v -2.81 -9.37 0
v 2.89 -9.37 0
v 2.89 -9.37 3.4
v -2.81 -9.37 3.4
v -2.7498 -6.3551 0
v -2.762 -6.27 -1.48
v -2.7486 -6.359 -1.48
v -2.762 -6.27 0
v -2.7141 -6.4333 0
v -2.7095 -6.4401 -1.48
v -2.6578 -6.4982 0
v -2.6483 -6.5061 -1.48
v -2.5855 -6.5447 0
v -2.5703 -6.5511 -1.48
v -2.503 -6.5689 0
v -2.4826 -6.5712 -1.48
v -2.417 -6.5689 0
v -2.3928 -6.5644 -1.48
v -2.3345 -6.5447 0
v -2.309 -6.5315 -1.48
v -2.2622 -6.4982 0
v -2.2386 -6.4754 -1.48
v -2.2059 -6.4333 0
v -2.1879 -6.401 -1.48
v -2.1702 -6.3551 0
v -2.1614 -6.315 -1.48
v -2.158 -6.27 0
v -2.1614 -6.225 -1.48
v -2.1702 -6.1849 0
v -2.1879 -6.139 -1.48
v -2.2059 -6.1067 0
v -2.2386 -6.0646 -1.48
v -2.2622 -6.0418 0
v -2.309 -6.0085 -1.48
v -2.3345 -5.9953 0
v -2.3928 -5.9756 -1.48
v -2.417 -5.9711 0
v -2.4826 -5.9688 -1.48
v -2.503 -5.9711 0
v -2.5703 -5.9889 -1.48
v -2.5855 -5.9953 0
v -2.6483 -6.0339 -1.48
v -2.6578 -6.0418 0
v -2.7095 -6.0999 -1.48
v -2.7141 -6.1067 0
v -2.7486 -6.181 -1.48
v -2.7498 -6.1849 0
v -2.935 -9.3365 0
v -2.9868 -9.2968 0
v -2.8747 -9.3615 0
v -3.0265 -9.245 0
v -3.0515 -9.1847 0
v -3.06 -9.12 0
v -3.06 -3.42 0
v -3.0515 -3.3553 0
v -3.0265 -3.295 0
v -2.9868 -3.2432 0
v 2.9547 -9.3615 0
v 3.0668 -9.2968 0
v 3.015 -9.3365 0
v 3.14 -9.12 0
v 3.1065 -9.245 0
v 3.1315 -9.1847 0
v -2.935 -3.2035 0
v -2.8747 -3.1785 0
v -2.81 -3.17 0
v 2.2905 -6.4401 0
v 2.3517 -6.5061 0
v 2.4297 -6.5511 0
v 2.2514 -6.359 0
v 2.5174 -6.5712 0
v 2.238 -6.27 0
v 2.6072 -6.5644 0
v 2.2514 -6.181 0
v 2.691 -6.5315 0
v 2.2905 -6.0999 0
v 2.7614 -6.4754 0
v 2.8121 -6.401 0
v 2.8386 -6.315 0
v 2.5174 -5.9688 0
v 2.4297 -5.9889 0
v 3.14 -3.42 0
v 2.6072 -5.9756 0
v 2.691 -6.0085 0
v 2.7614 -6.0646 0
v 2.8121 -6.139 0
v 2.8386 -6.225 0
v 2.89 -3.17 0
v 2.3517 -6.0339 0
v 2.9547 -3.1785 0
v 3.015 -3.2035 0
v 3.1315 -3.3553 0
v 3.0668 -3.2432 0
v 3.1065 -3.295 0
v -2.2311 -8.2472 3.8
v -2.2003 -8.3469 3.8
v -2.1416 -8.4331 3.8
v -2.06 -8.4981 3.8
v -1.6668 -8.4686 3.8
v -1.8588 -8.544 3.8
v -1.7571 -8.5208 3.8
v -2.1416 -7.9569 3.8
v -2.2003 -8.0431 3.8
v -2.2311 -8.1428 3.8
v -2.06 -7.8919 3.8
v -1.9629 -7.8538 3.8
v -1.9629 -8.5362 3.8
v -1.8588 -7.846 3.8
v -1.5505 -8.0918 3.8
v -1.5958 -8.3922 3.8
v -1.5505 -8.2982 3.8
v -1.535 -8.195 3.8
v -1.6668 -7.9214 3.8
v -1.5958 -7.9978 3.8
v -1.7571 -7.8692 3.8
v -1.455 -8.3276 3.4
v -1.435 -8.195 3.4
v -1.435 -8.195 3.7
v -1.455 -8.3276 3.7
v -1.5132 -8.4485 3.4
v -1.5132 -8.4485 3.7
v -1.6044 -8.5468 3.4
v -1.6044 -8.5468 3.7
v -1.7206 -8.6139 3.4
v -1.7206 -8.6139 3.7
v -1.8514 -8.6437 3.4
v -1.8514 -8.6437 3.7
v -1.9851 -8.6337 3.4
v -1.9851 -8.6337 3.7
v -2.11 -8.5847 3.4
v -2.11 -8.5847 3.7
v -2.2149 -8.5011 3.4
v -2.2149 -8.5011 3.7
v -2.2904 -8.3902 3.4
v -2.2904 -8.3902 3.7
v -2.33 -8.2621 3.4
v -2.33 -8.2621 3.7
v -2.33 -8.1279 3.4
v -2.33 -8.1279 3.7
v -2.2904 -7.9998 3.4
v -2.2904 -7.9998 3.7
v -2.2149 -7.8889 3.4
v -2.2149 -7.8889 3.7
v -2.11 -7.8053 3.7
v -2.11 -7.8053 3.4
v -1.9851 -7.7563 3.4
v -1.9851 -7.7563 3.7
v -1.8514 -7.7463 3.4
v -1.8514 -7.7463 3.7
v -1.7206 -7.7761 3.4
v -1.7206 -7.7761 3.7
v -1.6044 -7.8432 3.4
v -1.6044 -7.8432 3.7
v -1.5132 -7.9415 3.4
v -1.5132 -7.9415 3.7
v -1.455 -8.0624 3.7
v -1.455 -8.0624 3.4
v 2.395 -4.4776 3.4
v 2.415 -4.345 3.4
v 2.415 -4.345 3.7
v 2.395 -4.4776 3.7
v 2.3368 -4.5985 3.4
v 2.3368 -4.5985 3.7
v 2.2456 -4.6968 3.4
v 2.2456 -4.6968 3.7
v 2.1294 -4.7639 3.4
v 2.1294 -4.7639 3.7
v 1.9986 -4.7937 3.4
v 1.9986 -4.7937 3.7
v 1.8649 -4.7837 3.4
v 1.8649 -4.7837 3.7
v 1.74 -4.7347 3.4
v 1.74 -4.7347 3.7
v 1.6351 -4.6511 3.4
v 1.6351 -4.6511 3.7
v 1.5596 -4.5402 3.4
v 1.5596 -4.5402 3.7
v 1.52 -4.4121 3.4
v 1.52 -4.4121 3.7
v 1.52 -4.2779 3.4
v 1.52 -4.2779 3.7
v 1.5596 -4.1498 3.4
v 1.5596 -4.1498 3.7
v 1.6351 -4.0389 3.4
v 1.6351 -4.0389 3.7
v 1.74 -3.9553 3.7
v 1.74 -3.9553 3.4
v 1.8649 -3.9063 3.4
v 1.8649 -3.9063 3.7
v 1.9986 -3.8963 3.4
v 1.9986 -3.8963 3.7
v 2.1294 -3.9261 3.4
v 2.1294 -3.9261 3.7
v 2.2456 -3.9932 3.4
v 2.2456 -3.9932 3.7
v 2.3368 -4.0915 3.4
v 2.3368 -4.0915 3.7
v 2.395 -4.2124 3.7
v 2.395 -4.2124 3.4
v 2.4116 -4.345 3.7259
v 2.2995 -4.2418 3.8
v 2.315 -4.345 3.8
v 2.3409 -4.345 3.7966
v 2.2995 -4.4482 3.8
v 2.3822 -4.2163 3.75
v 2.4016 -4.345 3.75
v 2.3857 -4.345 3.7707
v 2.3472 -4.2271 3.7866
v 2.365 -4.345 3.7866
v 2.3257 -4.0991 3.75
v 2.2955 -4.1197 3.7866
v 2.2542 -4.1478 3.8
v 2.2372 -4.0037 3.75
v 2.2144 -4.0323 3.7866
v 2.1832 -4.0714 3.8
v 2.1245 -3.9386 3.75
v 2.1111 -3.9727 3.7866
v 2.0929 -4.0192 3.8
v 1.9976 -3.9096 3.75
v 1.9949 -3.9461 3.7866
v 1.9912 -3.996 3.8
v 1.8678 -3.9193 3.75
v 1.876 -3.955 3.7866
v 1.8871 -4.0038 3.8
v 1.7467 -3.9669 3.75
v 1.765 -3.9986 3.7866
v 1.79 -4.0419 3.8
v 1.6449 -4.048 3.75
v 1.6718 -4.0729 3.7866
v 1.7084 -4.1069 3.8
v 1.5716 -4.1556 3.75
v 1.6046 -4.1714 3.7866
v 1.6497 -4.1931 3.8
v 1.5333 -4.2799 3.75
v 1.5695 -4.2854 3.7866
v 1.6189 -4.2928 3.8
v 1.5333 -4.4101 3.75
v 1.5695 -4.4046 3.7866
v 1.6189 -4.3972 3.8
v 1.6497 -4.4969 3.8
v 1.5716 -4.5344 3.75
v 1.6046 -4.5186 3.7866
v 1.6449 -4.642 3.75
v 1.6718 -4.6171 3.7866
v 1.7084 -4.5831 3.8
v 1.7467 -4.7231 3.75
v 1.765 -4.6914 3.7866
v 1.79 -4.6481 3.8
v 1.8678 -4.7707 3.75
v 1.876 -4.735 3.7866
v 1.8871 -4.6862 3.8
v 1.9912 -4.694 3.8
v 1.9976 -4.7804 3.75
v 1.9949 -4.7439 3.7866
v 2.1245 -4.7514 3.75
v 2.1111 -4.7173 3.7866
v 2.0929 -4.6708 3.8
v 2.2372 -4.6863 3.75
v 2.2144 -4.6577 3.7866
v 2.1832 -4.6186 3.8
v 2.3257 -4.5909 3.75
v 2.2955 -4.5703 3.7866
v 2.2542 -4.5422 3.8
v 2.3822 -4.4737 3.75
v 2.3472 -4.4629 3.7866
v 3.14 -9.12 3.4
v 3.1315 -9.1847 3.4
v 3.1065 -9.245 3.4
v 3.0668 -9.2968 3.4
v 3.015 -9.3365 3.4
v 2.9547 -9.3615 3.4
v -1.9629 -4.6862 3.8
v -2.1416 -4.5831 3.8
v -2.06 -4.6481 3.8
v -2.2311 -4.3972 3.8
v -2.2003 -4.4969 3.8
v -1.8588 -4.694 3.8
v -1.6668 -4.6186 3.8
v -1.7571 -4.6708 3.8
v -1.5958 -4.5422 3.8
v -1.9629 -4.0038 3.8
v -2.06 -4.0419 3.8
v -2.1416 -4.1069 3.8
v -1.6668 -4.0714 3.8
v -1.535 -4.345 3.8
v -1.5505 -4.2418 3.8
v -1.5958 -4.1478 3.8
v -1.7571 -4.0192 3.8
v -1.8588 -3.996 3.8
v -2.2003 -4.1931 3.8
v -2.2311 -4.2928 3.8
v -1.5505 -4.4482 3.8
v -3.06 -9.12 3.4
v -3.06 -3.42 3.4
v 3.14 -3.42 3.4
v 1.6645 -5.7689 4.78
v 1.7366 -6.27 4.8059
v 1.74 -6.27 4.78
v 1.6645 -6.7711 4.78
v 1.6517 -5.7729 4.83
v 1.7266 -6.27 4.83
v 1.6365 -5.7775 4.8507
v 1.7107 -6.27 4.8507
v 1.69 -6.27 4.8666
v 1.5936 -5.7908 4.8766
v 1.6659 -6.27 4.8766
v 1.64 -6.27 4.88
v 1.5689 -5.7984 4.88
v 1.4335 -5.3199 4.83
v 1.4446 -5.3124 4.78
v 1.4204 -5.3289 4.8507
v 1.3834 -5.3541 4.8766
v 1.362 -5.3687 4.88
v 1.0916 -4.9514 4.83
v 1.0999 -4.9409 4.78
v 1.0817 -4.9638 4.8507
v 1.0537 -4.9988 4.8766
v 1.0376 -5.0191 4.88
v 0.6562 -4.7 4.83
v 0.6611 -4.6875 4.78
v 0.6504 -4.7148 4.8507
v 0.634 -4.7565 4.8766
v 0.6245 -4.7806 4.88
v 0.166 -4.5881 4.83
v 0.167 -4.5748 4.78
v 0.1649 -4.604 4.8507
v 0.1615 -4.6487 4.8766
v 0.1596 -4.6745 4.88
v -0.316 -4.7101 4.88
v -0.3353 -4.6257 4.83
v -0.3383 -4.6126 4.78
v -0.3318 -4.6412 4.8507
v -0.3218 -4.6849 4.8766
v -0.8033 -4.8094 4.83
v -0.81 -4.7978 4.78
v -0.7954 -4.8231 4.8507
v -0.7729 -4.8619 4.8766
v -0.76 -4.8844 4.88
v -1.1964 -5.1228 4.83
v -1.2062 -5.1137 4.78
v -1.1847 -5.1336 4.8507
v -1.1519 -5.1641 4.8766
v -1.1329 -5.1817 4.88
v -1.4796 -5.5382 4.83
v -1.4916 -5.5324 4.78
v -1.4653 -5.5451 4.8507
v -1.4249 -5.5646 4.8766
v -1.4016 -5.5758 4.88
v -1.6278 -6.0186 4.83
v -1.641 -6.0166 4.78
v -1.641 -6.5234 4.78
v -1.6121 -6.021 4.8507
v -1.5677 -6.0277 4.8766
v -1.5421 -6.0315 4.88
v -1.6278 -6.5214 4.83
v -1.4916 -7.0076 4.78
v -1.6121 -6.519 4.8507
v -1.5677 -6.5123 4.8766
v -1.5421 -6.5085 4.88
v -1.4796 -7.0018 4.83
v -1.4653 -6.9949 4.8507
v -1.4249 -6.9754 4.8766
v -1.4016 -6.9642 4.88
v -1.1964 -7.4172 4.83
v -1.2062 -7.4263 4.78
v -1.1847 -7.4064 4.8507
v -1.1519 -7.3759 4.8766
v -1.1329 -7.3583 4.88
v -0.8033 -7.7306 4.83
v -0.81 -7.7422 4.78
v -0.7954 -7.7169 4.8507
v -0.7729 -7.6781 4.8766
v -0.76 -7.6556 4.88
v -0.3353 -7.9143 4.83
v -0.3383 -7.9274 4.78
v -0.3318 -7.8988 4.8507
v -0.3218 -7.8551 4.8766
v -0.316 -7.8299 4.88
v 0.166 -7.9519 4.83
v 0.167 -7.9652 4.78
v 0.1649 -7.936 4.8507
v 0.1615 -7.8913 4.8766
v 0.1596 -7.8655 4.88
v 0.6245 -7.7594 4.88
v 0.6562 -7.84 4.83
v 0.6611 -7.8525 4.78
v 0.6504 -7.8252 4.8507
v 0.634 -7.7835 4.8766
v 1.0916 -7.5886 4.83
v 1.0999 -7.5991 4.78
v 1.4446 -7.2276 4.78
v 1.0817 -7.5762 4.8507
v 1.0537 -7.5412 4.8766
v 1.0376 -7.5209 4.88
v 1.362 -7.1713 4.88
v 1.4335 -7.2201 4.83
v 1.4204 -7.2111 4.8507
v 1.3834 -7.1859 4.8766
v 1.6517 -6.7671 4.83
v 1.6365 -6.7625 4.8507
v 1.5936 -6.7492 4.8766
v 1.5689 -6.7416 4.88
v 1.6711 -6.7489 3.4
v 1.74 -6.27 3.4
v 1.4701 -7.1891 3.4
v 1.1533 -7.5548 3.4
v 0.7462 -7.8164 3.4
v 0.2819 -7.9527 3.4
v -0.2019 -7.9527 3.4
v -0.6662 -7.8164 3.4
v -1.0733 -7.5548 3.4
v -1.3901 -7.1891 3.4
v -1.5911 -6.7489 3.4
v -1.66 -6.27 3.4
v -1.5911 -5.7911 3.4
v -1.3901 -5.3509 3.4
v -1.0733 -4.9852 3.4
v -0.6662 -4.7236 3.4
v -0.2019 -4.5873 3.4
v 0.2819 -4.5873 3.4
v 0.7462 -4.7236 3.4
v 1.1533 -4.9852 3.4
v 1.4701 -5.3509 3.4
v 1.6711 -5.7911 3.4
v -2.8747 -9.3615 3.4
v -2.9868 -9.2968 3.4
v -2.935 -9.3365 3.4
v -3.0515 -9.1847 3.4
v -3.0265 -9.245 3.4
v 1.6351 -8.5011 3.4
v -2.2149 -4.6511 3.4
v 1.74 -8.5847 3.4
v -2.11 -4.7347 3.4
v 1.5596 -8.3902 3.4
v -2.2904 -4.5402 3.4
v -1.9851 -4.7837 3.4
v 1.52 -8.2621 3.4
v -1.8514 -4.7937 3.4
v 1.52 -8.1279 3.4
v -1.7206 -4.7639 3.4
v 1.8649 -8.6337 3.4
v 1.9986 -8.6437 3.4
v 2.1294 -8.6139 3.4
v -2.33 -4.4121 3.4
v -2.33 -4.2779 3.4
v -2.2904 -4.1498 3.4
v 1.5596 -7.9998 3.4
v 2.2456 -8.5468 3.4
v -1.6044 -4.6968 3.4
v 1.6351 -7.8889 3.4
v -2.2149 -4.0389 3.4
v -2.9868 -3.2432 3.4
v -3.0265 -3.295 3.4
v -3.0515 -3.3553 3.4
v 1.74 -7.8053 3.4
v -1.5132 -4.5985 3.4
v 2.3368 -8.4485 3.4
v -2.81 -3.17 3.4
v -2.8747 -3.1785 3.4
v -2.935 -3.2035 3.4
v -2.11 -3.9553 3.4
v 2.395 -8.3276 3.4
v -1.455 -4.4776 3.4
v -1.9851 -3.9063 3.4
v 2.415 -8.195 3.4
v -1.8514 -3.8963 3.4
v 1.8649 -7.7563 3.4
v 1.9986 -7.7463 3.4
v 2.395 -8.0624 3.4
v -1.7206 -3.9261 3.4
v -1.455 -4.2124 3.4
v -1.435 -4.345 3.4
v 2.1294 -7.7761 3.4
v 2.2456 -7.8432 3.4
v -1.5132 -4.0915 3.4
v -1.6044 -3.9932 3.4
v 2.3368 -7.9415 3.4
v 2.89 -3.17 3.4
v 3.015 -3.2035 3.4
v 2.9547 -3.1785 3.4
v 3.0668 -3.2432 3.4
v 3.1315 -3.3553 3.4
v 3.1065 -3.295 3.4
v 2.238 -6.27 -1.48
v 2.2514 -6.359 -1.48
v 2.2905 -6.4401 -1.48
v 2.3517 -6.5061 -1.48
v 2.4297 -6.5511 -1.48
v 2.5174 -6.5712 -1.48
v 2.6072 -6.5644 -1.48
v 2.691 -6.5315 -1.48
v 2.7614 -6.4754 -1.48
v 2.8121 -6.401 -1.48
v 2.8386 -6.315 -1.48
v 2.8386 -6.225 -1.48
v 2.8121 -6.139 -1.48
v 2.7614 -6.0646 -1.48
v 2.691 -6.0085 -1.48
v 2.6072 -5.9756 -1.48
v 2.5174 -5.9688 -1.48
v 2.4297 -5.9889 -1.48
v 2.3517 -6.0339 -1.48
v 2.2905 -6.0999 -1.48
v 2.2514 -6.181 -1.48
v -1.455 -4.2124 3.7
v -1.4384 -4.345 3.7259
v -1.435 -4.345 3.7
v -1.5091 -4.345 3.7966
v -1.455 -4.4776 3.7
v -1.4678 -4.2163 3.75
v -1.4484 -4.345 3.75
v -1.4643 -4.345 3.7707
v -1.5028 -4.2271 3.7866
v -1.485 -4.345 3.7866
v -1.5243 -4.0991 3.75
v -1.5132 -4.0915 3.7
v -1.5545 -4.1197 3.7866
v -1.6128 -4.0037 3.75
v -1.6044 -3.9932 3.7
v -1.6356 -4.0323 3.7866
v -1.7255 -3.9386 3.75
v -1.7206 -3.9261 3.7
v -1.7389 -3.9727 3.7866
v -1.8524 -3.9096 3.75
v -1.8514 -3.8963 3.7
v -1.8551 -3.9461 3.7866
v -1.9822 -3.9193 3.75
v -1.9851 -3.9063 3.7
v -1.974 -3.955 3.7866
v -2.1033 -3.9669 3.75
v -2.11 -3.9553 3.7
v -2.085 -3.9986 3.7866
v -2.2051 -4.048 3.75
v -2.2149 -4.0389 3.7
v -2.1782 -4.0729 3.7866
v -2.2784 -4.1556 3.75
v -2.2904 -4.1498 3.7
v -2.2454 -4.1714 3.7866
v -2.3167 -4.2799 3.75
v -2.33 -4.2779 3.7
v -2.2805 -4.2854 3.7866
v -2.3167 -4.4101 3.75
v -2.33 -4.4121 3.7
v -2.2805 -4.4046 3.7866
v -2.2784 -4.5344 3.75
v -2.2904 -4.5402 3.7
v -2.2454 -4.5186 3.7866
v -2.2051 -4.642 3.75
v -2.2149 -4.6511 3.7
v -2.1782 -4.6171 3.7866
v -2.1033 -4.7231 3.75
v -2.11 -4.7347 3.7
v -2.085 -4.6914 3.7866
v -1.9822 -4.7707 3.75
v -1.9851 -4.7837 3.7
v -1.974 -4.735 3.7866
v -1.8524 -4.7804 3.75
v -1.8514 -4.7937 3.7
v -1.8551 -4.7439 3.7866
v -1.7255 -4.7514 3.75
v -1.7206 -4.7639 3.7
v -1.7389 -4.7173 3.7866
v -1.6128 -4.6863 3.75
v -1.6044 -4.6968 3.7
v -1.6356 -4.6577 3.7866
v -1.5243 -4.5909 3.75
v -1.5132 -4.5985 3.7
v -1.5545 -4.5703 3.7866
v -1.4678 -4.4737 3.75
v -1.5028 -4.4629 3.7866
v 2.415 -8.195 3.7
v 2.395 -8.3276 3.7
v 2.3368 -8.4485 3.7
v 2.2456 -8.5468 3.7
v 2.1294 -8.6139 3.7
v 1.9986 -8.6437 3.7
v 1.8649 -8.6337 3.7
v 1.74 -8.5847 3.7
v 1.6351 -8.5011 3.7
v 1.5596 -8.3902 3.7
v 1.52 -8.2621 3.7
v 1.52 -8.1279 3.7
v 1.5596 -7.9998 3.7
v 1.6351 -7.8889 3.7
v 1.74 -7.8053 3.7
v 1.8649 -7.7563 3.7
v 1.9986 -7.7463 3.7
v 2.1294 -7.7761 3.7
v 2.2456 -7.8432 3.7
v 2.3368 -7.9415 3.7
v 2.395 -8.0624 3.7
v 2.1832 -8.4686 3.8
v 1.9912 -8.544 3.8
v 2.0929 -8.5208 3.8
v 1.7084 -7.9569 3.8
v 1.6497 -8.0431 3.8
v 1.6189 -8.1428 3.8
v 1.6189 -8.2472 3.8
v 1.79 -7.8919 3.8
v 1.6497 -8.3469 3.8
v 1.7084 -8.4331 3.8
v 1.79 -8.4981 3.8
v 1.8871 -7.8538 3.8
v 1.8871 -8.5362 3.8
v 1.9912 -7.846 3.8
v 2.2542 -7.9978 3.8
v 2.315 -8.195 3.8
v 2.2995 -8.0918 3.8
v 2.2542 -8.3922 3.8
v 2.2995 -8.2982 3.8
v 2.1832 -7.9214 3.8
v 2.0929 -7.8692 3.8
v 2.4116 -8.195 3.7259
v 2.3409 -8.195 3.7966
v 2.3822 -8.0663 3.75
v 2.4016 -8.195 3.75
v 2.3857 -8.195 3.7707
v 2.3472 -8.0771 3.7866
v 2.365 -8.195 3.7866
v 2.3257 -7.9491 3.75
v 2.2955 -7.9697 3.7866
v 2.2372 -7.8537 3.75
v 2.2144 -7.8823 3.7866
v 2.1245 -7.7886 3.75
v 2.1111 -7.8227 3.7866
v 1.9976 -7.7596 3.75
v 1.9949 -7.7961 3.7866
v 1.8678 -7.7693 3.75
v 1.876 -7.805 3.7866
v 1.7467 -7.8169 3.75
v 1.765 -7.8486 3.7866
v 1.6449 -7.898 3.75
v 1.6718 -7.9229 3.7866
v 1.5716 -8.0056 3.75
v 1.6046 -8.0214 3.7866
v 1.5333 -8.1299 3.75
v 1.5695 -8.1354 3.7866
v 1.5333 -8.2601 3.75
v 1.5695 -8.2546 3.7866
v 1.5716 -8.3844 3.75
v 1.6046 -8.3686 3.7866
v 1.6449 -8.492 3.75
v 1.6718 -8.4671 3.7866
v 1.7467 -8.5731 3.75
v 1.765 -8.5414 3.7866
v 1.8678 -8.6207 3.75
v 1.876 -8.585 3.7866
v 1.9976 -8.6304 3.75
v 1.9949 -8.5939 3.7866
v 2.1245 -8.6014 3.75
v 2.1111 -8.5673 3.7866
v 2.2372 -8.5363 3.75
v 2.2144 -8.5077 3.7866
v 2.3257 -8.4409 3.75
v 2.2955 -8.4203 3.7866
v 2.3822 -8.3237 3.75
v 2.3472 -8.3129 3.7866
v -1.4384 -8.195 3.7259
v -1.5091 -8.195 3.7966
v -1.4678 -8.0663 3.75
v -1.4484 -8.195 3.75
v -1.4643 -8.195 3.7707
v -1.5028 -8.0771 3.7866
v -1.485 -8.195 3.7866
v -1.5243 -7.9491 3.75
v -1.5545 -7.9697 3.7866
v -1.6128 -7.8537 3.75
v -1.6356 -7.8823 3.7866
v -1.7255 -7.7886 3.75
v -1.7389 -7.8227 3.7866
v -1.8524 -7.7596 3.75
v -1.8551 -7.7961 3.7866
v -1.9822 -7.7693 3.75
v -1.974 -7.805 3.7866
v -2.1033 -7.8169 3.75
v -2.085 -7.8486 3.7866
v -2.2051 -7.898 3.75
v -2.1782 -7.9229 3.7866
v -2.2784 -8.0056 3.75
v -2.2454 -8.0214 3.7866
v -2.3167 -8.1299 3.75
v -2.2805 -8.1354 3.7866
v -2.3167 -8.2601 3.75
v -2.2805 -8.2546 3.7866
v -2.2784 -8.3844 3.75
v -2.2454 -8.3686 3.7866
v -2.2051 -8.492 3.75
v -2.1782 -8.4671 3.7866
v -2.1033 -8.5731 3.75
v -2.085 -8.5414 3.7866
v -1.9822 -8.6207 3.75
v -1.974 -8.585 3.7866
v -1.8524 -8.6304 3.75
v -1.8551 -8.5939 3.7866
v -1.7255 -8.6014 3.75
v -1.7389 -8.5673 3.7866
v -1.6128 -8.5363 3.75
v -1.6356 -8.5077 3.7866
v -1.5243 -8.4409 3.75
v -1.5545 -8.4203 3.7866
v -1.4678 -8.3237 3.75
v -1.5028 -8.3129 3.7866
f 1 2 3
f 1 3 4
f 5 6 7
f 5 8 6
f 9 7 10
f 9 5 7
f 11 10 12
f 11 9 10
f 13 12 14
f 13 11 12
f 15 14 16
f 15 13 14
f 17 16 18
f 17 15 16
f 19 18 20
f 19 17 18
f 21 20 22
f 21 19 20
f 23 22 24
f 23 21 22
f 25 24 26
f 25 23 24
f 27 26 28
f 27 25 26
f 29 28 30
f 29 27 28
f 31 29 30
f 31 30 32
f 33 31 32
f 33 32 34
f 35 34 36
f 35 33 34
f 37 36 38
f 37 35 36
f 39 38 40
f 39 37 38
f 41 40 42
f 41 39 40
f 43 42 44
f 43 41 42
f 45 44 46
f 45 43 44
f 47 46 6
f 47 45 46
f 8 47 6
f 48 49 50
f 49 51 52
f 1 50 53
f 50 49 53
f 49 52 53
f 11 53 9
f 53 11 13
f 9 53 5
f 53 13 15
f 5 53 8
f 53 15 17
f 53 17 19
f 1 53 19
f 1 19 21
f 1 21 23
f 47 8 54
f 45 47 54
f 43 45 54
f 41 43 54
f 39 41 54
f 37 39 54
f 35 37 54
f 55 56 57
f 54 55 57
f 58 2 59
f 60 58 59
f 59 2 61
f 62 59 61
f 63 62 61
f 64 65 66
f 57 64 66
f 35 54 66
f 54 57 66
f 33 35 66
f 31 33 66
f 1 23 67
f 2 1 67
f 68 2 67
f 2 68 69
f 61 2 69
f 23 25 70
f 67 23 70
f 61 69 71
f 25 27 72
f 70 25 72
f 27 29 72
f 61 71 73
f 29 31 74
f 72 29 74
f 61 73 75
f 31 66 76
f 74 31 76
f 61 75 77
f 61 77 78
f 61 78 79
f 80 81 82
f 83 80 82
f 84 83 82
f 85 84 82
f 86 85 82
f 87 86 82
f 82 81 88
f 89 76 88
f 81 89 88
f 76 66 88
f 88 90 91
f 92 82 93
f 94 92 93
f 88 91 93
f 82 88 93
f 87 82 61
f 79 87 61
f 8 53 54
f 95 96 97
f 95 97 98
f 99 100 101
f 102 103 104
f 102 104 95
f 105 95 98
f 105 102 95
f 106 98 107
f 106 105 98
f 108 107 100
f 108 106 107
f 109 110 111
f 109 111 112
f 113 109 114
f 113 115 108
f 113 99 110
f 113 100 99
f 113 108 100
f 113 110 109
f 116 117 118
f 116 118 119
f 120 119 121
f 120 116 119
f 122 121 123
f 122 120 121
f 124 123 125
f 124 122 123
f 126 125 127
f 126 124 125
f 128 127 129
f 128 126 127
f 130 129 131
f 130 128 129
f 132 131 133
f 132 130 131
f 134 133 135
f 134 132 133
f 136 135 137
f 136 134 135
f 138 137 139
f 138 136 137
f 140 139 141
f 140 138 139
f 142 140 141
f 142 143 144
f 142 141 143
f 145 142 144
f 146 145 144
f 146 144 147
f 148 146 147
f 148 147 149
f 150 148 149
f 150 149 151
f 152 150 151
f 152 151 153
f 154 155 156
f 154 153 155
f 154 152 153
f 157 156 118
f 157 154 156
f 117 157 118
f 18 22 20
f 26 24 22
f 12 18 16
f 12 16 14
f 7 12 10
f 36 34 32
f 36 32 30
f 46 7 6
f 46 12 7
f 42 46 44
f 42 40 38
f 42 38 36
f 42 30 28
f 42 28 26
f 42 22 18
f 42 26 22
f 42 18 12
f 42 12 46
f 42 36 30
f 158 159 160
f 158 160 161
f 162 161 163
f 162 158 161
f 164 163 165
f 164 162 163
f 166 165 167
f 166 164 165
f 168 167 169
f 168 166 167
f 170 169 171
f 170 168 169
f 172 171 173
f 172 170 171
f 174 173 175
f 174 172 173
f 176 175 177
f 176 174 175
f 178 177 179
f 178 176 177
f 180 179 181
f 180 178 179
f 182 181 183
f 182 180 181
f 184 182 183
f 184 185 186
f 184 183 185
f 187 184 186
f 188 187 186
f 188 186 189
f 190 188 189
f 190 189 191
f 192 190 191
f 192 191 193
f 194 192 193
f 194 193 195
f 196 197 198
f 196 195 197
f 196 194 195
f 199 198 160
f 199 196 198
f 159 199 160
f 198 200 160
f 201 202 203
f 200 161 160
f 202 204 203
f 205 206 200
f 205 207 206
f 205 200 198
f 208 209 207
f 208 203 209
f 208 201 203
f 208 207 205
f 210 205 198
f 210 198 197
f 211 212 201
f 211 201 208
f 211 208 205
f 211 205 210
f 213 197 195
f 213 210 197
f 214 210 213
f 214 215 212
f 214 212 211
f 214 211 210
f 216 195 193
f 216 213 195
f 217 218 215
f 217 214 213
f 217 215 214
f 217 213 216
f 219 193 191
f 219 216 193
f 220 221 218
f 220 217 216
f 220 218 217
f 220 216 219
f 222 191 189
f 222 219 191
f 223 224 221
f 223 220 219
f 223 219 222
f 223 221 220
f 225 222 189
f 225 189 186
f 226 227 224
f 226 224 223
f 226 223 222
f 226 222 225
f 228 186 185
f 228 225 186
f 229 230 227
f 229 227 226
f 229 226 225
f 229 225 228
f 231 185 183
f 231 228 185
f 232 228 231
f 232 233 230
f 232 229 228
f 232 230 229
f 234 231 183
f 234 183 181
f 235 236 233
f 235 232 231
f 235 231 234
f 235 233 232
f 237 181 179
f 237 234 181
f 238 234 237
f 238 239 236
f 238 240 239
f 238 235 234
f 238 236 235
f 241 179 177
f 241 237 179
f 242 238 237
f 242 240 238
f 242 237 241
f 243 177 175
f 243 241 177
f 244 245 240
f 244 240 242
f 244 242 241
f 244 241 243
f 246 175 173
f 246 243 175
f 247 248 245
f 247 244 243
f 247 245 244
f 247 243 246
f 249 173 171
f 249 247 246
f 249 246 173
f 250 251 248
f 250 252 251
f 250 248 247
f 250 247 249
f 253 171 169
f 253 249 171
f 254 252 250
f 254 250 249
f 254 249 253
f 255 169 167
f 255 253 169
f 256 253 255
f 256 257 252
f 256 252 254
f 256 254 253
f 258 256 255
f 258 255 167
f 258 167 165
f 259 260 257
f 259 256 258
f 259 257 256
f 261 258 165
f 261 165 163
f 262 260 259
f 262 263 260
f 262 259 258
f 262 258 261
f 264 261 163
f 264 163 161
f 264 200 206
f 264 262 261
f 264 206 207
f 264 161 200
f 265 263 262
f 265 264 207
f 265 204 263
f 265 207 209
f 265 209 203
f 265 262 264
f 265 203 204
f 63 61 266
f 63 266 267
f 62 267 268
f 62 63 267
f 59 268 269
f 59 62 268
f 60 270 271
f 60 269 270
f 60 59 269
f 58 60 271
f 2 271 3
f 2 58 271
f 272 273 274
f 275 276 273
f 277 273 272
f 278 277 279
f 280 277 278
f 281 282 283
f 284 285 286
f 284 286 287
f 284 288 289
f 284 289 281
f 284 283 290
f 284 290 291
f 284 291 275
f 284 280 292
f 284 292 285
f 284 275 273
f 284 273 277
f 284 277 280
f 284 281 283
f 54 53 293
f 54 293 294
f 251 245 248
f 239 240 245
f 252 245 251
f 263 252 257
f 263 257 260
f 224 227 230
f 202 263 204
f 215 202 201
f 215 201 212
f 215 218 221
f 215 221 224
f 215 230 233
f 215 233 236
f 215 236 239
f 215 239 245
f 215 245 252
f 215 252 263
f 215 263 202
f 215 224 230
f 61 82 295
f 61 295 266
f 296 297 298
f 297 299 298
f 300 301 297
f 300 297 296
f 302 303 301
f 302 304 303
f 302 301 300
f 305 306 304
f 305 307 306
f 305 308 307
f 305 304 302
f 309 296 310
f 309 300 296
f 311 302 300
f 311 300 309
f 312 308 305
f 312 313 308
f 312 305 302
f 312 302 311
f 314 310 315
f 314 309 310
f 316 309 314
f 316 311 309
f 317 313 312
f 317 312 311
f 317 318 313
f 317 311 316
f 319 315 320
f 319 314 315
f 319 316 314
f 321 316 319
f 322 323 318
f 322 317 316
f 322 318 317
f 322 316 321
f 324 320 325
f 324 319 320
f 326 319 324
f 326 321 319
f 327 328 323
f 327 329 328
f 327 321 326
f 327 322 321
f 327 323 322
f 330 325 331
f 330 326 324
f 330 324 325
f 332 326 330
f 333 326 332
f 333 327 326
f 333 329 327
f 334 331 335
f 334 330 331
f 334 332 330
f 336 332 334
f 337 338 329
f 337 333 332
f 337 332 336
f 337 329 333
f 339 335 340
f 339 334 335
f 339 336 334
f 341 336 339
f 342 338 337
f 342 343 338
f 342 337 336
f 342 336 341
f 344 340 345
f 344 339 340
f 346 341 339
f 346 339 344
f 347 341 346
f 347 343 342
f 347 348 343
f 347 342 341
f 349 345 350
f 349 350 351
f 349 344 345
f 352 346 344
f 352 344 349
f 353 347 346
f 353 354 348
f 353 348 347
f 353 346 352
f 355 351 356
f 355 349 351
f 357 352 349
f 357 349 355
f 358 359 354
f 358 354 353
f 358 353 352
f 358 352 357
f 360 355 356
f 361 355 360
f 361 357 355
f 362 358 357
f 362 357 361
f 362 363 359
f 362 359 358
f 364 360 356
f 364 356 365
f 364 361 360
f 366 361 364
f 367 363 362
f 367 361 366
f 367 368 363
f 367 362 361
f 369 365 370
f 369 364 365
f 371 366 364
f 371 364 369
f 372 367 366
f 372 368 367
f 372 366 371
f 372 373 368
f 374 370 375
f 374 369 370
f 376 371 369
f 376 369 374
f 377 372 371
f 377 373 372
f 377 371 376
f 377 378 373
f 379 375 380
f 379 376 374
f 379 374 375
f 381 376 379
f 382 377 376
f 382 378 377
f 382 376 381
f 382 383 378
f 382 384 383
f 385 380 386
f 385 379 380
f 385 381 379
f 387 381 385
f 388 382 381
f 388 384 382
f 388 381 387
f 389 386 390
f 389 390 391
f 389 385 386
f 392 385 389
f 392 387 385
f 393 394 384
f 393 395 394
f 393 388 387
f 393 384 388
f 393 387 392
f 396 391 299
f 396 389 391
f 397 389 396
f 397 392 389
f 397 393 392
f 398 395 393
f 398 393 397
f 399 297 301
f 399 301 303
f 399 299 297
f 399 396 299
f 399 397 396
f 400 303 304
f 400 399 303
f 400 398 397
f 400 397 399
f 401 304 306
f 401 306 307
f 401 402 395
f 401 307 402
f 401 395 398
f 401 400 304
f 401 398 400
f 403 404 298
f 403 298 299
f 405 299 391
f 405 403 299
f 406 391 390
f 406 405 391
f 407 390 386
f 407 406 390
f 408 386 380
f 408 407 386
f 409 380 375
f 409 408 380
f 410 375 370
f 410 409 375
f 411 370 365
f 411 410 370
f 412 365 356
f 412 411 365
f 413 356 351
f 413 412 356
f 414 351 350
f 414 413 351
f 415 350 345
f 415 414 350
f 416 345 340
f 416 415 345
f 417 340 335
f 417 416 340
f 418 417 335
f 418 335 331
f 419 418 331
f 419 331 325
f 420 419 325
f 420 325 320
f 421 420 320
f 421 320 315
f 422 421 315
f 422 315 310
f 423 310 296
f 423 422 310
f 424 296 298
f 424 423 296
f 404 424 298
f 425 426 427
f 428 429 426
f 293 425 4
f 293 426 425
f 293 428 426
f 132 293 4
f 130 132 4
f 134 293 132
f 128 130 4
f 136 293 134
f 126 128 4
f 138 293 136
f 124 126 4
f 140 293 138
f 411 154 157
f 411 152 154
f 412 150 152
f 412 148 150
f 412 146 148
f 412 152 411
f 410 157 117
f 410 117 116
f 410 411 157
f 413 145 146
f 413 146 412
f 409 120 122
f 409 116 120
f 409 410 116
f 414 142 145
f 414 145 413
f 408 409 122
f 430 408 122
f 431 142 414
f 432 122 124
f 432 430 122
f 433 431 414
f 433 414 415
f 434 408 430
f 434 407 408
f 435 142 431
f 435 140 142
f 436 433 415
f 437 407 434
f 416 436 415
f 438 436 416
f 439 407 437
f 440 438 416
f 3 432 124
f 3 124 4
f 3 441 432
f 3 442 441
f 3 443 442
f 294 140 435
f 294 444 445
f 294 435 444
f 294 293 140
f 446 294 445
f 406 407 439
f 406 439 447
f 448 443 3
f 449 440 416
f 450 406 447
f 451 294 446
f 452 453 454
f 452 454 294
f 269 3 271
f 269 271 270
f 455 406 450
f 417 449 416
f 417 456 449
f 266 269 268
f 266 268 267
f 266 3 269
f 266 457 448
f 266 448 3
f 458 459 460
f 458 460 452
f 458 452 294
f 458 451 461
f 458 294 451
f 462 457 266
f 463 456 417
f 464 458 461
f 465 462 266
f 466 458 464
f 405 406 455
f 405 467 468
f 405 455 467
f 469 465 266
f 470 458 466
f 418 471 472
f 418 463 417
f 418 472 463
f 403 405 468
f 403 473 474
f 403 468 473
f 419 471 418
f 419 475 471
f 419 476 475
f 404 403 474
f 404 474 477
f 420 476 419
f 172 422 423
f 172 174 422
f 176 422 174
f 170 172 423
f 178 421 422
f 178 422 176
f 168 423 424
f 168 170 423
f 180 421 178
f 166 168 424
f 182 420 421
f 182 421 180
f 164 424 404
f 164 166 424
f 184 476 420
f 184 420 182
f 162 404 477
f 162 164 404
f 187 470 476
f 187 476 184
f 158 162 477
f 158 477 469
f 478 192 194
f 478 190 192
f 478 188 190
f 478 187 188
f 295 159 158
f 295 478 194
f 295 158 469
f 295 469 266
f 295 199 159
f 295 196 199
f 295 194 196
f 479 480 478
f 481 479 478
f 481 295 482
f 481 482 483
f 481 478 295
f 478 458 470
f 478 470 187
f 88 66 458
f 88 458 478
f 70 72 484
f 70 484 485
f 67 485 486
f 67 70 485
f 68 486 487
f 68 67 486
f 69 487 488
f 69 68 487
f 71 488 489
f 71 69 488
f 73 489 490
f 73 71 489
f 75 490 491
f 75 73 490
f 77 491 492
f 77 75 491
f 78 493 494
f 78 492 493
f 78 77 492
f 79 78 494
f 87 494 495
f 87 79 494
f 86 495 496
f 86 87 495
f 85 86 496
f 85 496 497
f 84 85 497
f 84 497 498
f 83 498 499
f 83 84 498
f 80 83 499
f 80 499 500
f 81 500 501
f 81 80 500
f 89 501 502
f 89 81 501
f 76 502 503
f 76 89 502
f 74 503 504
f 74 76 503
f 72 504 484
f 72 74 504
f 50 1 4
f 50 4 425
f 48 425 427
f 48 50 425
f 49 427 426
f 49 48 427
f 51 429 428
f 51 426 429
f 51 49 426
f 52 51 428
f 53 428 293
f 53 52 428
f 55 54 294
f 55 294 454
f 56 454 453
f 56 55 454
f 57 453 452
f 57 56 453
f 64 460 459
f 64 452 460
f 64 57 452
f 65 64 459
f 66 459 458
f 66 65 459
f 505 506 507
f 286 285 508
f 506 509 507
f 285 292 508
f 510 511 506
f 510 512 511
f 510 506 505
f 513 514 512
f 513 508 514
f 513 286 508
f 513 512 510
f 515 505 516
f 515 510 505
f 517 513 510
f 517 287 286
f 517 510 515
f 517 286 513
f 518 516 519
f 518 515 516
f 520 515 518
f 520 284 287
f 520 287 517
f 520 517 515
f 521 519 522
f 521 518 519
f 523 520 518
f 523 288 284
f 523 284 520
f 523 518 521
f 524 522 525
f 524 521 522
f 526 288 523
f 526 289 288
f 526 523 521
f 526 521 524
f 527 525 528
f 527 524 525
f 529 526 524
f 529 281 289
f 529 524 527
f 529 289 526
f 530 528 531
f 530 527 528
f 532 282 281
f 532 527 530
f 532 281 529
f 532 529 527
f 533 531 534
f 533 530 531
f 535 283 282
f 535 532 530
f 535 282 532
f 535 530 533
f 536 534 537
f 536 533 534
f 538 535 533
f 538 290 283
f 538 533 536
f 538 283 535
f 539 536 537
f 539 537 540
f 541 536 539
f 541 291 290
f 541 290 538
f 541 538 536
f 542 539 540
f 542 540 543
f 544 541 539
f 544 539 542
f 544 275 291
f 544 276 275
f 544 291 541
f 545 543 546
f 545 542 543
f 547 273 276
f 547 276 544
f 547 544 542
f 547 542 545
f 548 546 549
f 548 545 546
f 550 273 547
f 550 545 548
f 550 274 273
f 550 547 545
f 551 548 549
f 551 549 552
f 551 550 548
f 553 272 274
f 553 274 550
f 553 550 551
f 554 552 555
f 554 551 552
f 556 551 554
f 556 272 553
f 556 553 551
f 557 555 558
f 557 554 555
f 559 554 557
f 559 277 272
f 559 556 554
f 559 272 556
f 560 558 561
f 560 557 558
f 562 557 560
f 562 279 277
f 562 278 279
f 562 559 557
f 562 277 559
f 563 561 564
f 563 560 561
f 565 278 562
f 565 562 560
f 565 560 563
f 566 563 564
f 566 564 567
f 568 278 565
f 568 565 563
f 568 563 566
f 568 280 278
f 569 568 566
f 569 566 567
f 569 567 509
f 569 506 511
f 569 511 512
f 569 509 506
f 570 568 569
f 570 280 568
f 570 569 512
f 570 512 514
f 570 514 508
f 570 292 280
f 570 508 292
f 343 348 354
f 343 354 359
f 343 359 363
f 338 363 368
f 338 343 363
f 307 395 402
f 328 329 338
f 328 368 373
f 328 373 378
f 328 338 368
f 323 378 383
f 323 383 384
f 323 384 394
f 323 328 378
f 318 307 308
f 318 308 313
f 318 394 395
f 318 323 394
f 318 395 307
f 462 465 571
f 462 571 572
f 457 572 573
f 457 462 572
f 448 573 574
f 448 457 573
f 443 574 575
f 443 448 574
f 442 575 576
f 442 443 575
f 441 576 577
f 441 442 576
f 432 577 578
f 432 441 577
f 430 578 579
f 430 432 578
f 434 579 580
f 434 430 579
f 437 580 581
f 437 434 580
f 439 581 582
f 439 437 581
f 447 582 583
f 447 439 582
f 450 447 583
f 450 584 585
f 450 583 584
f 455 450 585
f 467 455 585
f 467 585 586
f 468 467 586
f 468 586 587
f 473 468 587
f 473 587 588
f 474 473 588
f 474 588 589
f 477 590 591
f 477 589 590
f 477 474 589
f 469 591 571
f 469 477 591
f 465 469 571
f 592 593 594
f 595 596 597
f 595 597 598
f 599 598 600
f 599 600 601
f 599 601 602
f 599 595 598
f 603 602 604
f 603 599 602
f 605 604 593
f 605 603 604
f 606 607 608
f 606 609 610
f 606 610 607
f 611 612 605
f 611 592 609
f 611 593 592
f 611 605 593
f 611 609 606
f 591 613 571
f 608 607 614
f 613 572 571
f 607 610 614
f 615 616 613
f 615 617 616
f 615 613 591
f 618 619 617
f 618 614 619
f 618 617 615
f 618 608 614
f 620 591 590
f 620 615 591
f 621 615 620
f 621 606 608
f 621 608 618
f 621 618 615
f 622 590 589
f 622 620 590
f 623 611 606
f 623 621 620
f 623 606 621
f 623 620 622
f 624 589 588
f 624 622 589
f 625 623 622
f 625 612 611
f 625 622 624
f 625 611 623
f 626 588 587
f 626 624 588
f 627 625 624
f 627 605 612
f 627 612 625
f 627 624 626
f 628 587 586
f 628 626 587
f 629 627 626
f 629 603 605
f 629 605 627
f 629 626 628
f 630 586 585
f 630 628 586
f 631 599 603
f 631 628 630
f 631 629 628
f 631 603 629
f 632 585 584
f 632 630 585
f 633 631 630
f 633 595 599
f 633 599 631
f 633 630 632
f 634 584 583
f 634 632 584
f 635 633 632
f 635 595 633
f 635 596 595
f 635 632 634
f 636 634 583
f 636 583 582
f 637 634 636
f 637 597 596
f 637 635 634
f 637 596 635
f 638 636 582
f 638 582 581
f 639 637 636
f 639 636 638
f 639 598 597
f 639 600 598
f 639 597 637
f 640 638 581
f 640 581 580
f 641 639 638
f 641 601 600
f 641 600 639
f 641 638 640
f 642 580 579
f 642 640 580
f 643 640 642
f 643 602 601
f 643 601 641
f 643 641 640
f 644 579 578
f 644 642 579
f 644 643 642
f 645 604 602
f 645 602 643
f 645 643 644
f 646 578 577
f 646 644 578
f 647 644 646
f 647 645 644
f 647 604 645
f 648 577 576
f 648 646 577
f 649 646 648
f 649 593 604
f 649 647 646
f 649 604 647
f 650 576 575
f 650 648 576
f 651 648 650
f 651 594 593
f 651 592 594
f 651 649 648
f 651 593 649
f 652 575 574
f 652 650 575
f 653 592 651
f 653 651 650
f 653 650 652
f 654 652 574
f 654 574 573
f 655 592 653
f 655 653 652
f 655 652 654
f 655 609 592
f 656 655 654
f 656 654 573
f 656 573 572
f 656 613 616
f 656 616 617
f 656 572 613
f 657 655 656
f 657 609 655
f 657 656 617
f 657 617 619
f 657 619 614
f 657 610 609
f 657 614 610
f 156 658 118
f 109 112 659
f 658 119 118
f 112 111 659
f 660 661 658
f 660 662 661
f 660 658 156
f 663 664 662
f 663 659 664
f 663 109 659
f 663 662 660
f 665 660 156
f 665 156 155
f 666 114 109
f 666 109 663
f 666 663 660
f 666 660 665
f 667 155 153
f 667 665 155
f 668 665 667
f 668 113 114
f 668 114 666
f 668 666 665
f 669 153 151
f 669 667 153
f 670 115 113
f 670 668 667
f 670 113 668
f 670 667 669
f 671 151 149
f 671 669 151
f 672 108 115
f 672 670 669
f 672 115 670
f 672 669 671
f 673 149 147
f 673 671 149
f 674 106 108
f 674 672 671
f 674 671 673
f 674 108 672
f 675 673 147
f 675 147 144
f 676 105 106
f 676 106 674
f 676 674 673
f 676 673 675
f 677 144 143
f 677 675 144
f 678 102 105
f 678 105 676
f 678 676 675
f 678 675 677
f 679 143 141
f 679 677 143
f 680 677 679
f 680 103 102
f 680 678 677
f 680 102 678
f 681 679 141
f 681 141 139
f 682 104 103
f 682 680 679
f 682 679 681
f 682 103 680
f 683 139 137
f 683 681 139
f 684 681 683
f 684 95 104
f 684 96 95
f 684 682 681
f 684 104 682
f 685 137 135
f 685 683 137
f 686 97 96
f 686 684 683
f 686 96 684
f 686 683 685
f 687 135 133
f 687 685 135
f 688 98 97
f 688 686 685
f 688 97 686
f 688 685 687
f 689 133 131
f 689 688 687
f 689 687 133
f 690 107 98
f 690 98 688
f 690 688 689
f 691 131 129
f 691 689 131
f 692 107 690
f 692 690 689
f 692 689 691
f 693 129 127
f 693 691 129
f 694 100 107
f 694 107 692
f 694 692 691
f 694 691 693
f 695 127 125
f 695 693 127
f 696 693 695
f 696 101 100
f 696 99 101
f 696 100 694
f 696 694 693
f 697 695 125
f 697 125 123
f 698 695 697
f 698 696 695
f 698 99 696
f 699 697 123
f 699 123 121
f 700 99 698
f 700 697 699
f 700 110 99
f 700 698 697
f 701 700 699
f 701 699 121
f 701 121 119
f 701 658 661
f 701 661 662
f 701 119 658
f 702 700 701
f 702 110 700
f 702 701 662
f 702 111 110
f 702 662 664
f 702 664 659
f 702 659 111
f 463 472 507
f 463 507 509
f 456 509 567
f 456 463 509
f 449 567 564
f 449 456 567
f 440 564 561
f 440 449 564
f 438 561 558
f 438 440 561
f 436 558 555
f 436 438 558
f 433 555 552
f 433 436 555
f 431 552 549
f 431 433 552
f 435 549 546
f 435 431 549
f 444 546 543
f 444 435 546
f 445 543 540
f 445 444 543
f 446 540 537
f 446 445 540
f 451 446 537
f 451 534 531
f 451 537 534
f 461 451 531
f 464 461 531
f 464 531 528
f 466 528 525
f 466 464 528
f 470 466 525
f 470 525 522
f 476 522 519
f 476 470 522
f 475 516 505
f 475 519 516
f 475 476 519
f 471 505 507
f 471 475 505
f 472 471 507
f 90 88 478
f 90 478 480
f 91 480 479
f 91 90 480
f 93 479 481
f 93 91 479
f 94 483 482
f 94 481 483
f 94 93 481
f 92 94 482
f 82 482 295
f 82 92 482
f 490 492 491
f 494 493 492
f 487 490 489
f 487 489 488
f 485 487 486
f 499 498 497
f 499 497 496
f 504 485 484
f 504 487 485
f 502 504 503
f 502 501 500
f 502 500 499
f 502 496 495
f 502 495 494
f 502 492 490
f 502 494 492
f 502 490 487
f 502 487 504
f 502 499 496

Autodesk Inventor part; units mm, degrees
ref_plane "YZ Plane" through (0, 0, 0) normal (1, 0, 0) x (0, 1, 0)
ref_plane "Work Plane1" through (0, 0, 0) normal (0, 0, 1) x (1, 0, 0)
sketch "Sketch1" plane through (0, 0, 0) normal (0, 0, 1) x (1, 0, 0)
  circle A0 centre (2.54, -6.27) radius 0.302 projected
  circle A1 centre (-2.46, -6.27) radius 0.302 projected
  line L0 (2.54, -6.27) -> (-2.46, -6.27)
  line L1 (2.89, -9.37) -> (-2.81, -9.37)
  line L2 (-3.06, -9.12) -> (-3.06, -3.42)
  line L3 (-2.81, -3.17) -> (2.89, -3.17)
  line L4 (3.14, -3.42) -> (3.14, -9.12)
  line L5 (3.14, -9.37) -> (-3.06, -3.17) construction
  line L6 (-3.06, -9.37) -> (3.14, -3.17) construction
  arc A2 (2.89, -9.37) -> (3.14, -9.12) centre (2.89, -9.12) ccw
  arc A3 (-3.06, -9.12) -> (-2.81, -9.37) centre (-2.81, -9.12) ccw
  arc A4 (-2.81, -3.17) -> (-3.06, -3.42) centre (-2.81, -3.42) ccw
  arc A5 (3.14, -3.42) -> (2.89, -3.17) centre (2.89, -3.42) ccw
  point P0 (0, 0)
  point P1 (0.04, -6.27)
  dimension "d0" = 6.2
  dimension "d1" = 6.2
  dimension "d2" = 0.25
extrude "Extrusion1" add sketch "Sketch1" along normal blind 3.4 contours A0 | A1 | L1 A3 L2 A4 L3 A5 L4 A2
sketch "Sketch2" plane through (0, 0, 3.4) normal (0, 0, 1) x (1, 0, 0)
  arc A0 (2.89, -9.37) -> (3.14, -9.12) centre (2.89, -9.12) ccw projected
  line L0 (3.14, -9.12) -> (3.14, -3.42) projected
  arc A1 (3.14, -3.42) -> (2.89, -3.17) centre (2.89, -3.42) ccw projected
  line L1 (2.89, -3.17) -> (-2.81, -3.17) projected
  arc A2 (-2.81, -3.17) -> (-3.06, -3.42) centre (-2.81, -3.42) ccw projected
  line L2 (-3.06, -3.42) -> (-3.06, -9.12) projected
  arc A3 (-3.06, -9.12) -> (-2.81, -9.37) centre (-2.81, -9.12) ccw projected
  line L3 (-2.81, -9.37) -> (2.89, -9.37) projected
  line L4 (-1.885, -4.345) -> (1.965, -8.195) construction
  line L5 (1.965, -4.345) -> (-1.885, -8.195) construction
  circle A4 centre (1.965, -4.345) radius 0.45
  circle A5 centre (1.965, -8.195) radius 0.45
  circle A6 centre (-1.885, -8.195) radius 0.45
  circle A7 centre (-1.885, -4.345) radius 0.45
  point P0 (0, 0)
  point P1 (0.04, -6.27)
  dimension "d5" = 3.85
  dimension "d6" = 3.85
  dimension "d7" = 0.9
  dimension "d8" = 0.9
  dimension "d9" = 0.9
  dimension "d10" = 0.9
extrude "Extrusion2" add sketch "Sketch2" along normal blind 0.4 contours A4 | A5 | A6 | A7
fillet "Fillet1" radius 0.1 4 edges at (1.515, -4.345, 3.8) (1.515, -8.195, 3.8) (-2.335, -8.195, 3.8) (-2.335, -4.345, 3.8)
sketch "Sketch3" plane through (0, 0, 3.4) normal (0, 0, 1) x (1, 0, 0)
  circle A0 centre (-1.885, -8.195) radius 0.45 projected
  circle A1 centre (1.965, -8.195) radius 0.45 projected
  circle A2 centre (-1.885, -4.345) radius 0.45 projected
  circle A3 centre (1.965, -4.345) radius 0.45 projected
  arc A4 (2.89, -9.37) -> (3.14, -9.12) centre (2.89, -9.12) ccw projected
  line L0 (3.14, -9.12) -> (3.14, -3.42) projected
  arc A5 (3.14, -3.42) -> (2.89, -3.17) centre (2.89, -3.42) ccw projected
  line L1 (2.89, -3.17) -> (-2.81, -3.17) projected
  arc A6 (-2.81, -3.17) -> (-3.06, -3.42) centre (-2.81, -3.42) ccw projected
  line L2 (-3.06, -3.42) -> (-3.06, -9.12) projected
  arc A7 (-3.06, -9.12) -> (-2.81, -9.37) centre (-2.81, -9.12) ccw projected
  line L3 (-2.81, -9.37) -> (2.89, -9.37) projected
  circle A8 centre (0.04, -6.27) radius 1.7
  point P0 (0, 0)
  dimension "d14" = 3.4
extrude "Extrusion3" add sketch "Sketch3" along normal blind 1.48 contours A8
fillet "Fillet2" radius 0.1 1 edges at (-1.66, -6.27, 4.88)
sketch "Sketch4" plane through (0, 0, 0) normal (0, 0, -1) x (-1, 0, 0)
  circle A0 centre (2.46, -6.27) radius 0.302 projected
  circle A1 centre (-2.54, -6.27) radius 0.302 projected
  point P0 (0, 0)
extrude "Extrusion4" add sketch "Sketch4" along normal blind 1.48
ref_plane "Work Plane2" through (0.04, -9.12, 0) normal (1, 0, 0) x (0, 0, -1)
properties part number "Button"
